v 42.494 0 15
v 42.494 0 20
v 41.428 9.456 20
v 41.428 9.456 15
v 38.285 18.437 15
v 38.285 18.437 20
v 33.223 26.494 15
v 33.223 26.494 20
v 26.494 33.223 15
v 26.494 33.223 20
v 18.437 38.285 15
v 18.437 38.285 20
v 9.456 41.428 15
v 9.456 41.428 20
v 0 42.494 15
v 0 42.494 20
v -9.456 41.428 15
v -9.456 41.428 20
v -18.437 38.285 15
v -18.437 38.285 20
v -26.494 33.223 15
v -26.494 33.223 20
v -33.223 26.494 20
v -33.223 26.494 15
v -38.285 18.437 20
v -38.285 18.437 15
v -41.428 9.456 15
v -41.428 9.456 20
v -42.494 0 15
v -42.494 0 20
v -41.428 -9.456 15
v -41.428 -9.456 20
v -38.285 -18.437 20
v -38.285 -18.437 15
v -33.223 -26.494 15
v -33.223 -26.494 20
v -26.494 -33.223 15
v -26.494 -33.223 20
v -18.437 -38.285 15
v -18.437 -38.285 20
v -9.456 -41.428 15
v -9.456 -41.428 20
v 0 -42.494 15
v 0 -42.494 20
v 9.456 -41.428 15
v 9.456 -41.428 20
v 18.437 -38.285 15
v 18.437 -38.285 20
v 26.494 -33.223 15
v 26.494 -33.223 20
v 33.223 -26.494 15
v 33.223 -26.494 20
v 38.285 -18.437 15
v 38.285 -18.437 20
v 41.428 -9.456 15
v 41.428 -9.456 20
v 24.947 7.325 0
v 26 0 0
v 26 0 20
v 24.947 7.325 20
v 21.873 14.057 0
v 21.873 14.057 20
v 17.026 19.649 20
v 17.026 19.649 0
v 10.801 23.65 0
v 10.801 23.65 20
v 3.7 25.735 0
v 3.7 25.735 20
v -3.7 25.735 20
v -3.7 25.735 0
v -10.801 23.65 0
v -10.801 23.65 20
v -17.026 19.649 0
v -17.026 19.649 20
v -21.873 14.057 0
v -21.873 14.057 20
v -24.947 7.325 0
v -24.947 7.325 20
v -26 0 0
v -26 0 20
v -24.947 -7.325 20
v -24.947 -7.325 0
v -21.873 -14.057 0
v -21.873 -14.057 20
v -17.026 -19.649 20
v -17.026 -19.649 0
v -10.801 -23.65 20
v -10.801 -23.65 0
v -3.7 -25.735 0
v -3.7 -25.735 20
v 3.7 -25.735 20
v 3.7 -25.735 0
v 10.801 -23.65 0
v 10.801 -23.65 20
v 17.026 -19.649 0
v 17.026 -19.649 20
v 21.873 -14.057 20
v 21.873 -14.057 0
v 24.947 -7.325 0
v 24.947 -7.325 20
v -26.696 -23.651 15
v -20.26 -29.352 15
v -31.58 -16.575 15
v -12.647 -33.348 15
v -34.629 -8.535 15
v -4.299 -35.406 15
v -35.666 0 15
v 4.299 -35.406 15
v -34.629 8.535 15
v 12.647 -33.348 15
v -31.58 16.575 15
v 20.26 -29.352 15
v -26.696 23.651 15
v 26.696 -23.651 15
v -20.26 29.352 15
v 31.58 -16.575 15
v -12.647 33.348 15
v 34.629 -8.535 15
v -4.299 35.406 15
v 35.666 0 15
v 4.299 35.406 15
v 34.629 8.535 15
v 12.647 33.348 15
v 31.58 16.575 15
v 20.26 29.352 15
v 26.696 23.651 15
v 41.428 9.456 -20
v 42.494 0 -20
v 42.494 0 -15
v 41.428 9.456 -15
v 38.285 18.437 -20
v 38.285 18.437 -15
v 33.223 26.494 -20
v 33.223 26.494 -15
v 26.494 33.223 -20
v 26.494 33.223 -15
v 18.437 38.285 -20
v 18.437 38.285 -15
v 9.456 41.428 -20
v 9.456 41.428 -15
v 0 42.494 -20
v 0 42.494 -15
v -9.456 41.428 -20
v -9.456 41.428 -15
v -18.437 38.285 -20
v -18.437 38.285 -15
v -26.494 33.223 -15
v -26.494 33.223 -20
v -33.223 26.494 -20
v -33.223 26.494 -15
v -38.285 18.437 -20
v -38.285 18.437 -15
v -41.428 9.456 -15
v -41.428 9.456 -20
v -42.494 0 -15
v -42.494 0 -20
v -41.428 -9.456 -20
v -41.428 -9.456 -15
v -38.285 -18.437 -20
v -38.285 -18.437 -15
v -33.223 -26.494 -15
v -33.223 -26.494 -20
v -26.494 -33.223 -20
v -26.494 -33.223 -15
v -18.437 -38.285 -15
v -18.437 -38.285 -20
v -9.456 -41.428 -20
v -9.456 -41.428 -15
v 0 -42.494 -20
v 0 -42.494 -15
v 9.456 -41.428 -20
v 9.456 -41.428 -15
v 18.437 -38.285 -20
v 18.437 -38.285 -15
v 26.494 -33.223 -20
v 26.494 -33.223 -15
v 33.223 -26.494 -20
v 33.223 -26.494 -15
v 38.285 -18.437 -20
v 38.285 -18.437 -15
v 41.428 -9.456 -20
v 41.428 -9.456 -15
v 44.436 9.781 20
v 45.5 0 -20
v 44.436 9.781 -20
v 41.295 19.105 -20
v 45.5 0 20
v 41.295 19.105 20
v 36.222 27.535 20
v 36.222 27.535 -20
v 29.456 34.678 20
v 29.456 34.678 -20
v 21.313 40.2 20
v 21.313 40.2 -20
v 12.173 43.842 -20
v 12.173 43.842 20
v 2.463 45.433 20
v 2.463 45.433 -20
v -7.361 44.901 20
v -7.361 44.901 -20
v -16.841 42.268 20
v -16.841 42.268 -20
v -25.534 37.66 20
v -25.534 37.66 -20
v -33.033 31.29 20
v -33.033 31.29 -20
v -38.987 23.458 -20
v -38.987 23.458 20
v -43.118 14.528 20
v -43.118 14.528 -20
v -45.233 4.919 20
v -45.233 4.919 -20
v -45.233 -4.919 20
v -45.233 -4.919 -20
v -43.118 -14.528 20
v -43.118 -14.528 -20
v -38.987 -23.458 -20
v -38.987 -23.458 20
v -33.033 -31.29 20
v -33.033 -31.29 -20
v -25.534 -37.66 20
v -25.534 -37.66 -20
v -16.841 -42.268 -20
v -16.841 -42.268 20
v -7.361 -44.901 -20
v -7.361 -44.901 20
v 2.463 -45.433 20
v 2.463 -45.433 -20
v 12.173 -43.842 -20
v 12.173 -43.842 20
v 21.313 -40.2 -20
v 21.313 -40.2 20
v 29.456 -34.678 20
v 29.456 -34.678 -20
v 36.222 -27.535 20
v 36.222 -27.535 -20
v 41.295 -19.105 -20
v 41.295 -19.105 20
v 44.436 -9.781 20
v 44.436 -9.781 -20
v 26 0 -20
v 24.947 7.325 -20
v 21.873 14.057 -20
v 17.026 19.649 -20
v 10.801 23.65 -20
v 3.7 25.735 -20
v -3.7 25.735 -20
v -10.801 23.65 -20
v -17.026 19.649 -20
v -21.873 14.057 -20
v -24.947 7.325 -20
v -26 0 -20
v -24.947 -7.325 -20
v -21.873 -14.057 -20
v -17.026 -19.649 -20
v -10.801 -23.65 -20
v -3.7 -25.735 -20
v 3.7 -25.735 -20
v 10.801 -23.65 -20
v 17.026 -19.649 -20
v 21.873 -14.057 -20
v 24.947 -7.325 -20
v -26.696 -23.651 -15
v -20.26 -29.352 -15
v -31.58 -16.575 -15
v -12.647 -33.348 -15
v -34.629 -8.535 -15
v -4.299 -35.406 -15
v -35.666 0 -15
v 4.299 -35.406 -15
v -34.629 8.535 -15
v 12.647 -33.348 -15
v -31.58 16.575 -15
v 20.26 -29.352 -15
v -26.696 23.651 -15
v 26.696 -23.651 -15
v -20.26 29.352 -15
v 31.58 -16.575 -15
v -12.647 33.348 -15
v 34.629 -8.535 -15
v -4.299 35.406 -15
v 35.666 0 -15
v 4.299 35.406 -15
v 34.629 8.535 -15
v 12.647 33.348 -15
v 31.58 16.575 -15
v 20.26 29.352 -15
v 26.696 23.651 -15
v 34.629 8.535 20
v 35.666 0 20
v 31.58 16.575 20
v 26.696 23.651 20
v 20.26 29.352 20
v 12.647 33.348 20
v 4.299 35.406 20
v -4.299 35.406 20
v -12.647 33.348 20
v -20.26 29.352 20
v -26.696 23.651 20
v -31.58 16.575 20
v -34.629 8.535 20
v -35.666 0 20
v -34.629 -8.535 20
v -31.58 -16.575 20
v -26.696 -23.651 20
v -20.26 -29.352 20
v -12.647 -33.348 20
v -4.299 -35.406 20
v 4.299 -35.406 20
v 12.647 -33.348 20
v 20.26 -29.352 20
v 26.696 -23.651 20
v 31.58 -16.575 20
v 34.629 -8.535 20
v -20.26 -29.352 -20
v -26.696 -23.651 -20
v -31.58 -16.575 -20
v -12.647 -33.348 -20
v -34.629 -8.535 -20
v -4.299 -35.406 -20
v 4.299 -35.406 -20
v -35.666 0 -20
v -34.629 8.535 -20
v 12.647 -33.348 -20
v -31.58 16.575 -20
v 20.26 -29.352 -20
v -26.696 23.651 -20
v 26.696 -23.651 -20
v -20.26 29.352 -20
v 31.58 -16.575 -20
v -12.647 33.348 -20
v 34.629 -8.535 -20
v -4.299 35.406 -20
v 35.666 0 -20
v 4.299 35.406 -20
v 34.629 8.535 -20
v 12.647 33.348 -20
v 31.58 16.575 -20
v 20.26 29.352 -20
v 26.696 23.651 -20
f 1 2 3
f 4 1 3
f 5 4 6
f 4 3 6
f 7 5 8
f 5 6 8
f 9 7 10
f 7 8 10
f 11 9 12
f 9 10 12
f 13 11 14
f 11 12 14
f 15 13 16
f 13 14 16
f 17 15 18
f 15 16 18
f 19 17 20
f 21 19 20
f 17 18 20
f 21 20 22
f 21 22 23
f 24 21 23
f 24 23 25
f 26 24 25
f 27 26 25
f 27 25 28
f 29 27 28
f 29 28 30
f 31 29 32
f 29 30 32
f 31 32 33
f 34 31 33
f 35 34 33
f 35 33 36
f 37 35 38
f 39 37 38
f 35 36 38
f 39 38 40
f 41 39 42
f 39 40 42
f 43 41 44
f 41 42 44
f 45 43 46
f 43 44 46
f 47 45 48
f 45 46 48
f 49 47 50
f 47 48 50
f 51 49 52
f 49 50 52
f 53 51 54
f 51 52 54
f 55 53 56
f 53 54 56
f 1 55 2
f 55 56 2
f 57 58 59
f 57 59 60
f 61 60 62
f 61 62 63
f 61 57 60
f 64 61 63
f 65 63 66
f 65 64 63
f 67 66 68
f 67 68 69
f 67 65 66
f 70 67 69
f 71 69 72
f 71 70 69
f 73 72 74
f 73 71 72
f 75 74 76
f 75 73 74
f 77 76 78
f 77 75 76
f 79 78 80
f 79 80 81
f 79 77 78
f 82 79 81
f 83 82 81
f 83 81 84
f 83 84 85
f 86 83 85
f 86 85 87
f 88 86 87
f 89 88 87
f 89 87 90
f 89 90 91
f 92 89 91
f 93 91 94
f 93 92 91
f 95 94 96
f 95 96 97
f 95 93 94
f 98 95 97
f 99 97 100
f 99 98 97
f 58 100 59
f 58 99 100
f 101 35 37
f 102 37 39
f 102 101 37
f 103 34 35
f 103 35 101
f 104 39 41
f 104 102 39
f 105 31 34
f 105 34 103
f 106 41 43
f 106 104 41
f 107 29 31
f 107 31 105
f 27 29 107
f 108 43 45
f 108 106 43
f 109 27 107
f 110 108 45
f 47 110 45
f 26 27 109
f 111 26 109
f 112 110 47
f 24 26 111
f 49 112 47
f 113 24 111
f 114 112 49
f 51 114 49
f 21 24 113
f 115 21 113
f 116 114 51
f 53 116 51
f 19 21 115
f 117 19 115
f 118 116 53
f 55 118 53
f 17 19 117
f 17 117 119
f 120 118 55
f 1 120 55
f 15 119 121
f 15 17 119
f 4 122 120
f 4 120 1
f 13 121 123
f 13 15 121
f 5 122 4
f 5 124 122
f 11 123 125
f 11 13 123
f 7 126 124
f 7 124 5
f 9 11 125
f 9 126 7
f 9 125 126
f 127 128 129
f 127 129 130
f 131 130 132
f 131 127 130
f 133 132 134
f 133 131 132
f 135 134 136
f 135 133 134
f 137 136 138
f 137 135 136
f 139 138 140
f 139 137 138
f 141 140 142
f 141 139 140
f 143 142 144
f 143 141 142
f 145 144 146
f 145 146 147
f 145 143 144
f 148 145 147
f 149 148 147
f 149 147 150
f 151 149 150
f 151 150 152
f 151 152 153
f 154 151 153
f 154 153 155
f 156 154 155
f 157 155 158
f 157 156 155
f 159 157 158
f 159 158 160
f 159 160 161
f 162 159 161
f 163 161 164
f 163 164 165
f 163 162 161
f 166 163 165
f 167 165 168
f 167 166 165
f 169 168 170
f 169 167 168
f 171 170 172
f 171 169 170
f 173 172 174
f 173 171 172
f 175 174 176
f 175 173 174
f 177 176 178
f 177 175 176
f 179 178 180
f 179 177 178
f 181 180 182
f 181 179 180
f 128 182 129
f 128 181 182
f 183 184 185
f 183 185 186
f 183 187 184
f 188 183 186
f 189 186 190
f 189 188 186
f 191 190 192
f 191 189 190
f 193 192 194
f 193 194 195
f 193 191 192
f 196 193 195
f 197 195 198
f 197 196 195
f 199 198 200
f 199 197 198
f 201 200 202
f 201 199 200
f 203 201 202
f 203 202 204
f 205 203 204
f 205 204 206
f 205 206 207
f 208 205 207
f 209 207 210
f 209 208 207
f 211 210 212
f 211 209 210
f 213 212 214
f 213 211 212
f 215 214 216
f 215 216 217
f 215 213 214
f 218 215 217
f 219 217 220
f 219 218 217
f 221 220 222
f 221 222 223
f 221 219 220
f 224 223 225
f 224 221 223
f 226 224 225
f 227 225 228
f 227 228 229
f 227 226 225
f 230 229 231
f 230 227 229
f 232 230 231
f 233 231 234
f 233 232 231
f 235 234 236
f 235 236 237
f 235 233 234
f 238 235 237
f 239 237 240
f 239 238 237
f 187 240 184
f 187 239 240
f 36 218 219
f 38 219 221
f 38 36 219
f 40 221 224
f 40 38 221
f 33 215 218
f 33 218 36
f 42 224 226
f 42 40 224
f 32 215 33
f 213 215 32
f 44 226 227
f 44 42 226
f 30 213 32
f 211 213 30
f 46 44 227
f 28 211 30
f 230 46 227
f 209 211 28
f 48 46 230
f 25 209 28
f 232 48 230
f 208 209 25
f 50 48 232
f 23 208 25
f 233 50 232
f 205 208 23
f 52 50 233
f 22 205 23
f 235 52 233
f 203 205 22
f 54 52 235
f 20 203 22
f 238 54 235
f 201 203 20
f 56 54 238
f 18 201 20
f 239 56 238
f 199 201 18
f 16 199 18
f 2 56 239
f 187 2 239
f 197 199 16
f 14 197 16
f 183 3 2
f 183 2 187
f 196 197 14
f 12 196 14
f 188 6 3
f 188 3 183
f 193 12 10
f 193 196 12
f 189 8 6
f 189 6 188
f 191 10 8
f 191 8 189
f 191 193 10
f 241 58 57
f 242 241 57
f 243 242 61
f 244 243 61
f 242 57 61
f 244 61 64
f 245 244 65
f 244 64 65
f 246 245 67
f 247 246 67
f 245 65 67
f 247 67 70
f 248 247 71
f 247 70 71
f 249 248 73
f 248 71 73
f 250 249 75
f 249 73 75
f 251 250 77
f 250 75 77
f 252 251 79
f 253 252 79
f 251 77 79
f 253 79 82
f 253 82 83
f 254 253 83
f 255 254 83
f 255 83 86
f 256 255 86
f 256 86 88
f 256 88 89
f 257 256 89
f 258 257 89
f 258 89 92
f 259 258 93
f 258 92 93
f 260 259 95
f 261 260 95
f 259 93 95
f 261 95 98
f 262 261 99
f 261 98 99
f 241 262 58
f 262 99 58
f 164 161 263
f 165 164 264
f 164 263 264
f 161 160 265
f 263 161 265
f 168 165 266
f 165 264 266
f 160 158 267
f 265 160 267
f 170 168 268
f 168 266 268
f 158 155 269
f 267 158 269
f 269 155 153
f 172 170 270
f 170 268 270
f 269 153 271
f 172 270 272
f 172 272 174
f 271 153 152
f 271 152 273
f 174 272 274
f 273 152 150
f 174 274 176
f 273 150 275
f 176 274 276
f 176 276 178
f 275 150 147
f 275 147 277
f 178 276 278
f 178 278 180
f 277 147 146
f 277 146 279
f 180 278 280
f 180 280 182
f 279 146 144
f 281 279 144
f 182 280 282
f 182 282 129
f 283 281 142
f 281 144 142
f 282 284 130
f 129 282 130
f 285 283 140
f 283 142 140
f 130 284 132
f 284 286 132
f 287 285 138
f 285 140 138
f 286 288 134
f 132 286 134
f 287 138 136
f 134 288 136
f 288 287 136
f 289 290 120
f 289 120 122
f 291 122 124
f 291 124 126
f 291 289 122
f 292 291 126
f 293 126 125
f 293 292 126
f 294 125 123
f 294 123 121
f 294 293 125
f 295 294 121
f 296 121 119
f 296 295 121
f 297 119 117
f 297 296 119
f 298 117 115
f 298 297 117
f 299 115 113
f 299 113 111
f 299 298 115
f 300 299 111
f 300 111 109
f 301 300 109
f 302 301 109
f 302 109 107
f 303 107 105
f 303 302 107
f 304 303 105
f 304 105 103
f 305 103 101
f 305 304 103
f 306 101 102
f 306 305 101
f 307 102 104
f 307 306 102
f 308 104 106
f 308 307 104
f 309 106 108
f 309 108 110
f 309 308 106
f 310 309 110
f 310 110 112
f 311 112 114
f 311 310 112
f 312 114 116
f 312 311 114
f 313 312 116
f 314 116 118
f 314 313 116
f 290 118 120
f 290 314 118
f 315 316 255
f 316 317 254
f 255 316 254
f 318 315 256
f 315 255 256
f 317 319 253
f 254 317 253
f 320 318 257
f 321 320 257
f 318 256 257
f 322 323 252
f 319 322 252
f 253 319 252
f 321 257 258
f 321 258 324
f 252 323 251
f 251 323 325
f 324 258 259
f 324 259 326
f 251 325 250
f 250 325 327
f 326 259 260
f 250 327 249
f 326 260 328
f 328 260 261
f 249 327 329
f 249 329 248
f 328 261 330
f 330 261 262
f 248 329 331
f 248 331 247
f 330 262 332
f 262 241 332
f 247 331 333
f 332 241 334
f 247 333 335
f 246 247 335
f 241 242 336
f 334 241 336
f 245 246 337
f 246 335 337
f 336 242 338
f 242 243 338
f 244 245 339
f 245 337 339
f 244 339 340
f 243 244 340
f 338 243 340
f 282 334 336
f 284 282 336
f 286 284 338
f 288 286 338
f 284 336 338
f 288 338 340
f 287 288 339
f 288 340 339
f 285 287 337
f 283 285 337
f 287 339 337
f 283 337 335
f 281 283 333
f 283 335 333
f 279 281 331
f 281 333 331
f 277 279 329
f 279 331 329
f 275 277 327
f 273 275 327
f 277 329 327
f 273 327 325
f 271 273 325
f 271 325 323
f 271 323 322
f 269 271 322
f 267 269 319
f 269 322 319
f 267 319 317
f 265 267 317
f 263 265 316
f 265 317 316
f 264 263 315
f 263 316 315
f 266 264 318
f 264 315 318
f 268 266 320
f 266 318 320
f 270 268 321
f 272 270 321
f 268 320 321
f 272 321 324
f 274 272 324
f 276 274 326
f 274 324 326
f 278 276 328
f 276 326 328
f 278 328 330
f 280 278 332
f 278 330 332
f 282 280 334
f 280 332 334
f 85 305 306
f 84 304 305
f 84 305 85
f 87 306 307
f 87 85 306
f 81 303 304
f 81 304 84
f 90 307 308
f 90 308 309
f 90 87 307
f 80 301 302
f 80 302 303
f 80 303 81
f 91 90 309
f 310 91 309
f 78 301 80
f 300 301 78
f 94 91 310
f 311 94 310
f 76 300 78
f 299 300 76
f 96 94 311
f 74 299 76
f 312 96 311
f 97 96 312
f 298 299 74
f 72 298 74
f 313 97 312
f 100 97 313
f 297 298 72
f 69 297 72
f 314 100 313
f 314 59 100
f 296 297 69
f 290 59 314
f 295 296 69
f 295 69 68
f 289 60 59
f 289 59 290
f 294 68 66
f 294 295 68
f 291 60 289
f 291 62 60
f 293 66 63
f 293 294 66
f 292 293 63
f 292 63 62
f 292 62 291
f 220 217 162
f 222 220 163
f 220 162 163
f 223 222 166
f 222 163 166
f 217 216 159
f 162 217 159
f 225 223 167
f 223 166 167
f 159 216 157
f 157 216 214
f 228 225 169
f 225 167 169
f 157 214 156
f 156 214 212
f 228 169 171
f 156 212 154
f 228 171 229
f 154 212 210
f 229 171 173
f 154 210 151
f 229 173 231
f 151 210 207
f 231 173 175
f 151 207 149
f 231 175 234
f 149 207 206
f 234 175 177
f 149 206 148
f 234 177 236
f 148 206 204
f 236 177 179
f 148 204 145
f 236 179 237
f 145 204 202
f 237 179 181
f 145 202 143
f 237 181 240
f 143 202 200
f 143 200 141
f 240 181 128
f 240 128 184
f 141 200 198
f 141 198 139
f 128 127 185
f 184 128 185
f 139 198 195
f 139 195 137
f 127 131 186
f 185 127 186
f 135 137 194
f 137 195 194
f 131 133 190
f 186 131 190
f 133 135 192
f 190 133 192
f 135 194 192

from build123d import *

# Parameters (mm, degrees)
SKETCH1_R           = 45.5
SKETCH1_R_2         = 26
BOSS_EXTRUDE1_DEPTH = 20
SKETCH2_R           = 42.493578565
SKETCH2_R_2         = 35.665645311
CUT_EXTRUDE2_DEPTH  = 5


with BuildPart() as part:
    # Sketch1 → Boss-Extrude1 (new body)
    with BuildSketch(Plane.XY):
        Circle(SKETCH1_R)
        Circle(SKETCH1_R_2, mode=Mode.SUBTRACT)
    boss_extrude1 = extrude(amount=BOSS_EXTRUDE1_DEPTH)

    # Sketch2 → Cut-Extrude2 (cut)
    with BuildSketch(Plane.XY.offset(20)):
        Circle(SKETCH2_R)
        Circle(SKETCH2_R_2, mode=Mode.SUBTRACT)
    cut_extrude2 = extrude(amount=-CUT_EXTRUDE2_DEPTH, mode=Mode.SUBTRACT)


with BuildPart() as mirror1_1:
    # Mirror1: Boss-Extrude1 across Front Plane
    add(boss_extrude1.mirror(Plane.XY))

    # Mirror1 2: Cut-Extrude2 across Front Plane
    add(cut_extrude2.mirror(Plane.XY), mode=Mode.SUBTRACT)


with BuildPart() as part_1:
    add(part.part)

    # Mirror1 united with what the copies touc: union Mirror1_1
    add(mirror1_1.part)


solid = part_1.part
